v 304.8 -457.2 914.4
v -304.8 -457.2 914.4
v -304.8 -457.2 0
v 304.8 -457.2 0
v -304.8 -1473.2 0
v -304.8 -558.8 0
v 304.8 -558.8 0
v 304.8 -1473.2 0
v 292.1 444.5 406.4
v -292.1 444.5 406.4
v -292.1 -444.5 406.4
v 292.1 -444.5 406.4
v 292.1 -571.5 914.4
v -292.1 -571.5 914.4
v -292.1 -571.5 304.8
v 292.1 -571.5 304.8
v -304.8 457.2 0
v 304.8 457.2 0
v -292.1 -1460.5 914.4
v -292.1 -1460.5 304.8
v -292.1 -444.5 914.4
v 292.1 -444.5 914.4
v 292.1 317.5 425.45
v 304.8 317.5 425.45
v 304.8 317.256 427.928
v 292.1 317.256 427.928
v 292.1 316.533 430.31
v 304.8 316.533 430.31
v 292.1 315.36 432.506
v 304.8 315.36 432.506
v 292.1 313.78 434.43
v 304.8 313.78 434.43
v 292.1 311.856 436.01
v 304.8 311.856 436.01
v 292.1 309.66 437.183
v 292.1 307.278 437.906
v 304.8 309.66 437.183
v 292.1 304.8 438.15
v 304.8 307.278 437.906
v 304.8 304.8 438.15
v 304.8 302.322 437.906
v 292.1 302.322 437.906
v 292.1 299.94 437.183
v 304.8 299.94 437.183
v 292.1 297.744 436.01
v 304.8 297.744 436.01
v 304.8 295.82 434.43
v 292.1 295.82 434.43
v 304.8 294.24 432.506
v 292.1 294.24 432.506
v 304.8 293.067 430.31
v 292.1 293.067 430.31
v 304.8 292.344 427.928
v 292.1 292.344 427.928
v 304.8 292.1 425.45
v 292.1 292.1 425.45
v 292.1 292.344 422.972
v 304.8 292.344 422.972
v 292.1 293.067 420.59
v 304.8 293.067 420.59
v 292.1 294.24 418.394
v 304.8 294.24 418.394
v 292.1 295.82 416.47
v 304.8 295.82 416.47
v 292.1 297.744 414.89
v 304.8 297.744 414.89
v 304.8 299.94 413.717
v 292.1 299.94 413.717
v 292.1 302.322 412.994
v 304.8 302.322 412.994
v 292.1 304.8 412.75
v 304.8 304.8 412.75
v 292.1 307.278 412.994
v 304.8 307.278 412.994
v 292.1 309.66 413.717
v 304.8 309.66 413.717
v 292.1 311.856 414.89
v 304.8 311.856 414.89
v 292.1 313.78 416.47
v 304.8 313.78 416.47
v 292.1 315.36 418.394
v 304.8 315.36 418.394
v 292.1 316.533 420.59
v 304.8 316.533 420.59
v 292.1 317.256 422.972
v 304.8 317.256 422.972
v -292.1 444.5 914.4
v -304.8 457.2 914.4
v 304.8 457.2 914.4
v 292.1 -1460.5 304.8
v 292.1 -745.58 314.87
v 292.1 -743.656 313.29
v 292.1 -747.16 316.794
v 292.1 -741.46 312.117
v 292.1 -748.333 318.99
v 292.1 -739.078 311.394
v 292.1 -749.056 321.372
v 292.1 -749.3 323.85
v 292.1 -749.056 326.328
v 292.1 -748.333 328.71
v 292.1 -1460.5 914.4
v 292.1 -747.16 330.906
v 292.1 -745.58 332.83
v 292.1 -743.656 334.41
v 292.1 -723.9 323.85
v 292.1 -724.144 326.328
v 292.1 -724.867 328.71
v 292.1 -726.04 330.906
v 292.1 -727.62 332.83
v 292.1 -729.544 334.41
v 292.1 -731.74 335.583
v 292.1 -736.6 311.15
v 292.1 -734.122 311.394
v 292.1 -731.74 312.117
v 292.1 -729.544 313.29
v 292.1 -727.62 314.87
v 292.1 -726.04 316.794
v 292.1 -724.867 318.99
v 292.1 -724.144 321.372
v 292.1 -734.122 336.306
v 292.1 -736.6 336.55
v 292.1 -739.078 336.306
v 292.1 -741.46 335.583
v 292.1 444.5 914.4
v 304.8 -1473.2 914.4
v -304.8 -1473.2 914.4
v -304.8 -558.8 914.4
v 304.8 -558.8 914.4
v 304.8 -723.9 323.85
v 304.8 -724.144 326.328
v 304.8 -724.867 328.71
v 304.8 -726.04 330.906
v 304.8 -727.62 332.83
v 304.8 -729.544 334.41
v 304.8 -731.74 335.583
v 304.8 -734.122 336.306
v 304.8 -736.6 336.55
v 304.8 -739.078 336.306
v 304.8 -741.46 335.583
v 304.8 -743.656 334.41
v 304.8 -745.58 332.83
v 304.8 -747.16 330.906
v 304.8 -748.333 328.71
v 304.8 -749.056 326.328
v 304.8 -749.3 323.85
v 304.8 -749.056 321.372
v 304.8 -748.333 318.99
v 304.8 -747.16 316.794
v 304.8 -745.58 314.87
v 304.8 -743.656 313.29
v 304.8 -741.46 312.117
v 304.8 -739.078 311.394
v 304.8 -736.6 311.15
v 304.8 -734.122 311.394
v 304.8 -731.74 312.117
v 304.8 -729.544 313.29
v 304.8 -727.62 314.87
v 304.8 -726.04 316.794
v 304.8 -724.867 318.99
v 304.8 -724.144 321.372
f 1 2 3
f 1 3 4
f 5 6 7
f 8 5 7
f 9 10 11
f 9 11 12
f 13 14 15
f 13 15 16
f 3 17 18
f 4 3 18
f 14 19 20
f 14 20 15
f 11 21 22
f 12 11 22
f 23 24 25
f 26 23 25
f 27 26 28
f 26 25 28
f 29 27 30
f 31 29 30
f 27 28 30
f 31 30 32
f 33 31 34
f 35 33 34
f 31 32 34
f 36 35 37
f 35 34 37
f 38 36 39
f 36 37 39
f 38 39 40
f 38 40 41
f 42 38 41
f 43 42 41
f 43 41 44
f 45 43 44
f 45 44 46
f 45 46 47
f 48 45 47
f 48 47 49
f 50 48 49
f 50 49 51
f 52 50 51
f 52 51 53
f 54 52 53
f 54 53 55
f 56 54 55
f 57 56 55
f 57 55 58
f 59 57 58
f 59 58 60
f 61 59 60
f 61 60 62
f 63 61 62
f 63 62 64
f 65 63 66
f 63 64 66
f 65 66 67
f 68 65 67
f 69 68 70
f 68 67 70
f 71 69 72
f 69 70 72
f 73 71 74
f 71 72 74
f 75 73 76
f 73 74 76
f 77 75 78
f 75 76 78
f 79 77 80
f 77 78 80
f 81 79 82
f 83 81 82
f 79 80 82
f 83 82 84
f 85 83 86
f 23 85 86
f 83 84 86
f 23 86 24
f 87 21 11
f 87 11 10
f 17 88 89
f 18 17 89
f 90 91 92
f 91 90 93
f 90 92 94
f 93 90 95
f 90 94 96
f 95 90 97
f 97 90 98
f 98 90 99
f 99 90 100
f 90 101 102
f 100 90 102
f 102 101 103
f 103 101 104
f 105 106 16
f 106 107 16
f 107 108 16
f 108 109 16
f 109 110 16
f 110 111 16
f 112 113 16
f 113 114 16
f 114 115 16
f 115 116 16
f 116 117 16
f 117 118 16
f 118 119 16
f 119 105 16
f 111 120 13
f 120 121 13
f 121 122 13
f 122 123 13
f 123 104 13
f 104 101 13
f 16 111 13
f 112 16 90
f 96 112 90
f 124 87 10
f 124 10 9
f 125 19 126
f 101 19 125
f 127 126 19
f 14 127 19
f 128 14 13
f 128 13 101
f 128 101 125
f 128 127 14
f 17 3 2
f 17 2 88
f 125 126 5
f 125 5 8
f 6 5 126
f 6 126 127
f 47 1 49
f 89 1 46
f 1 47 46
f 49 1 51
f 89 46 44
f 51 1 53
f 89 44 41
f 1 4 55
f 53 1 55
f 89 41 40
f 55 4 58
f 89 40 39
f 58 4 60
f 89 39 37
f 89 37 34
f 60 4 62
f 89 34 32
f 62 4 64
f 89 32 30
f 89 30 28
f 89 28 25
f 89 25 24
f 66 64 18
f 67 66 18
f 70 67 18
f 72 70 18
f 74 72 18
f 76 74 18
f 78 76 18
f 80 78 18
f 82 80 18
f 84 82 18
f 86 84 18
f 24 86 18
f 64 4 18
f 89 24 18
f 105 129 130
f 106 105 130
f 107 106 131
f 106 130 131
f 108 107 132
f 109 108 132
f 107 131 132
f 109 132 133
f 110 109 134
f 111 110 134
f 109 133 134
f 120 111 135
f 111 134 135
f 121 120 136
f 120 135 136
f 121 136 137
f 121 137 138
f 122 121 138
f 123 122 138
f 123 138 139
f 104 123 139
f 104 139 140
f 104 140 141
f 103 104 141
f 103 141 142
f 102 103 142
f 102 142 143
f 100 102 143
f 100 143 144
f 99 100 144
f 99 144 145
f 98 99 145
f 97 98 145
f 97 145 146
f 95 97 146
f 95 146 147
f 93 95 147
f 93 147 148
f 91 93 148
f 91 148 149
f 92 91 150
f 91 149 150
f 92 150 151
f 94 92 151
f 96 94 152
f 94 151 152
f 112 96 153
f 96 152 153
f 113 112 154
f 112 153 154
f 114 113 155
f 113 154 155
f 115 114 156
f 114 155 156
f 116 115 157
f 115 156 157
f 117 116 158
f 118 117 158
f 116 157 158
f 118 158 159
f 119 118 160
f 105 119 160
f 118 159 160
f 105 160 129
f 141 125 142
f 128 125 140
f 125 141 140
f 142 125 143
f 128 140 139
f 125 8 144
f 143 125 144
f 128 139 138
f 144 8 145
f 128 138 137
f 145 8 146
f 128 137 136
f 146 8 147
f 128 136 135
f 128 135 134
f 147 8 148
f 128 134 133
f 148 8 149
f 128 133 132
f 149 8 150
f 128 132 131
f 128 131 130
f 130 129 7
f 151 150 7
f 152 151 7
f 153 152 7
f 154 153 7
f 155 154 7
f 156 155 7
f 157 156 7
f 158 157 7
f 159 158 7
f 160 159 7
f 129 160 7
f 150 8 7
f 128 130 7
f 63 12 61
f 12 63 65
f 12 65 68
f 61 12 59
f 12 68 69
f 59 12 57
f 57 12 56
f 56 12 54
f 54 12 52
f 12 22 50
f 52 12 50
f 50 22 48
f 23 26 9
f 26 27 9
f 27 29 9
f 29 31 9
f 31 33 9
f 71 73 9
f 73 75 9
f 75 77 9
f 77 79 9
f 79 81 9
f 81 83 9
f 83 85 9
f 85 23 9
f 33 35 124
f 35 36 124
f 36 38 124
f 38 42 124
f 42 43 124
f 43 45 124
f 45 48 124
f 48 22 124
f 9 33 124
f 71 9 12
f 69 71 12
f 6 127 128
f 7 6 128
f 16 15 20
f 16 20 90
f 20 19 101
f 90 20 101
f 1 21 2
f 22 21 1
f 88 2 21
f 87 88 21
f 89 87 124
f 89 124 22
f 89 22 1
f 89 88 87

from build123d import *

# Parameters (mm, degrees)
F0_W      = 609.6
F0_H      = 914.4
F1_DEPTH  = 914.4
F2_W      = 609.6
F2_H      = 914.4
F3_DEPTH  = 914.4
F4_W      = 584.2
F4_H      = 889
F5_DEPTH  = 508
F6_W      = 584.2
F6_H      = 889
F7_DEPTH  = 609.6
F8_R      = 12.7
F9_DEPTH  = 25.4
F10_R     = 12.7
F11_DEPTH = 25.4


with BuildPart() as f1:
    # F0 (on Top) → F1 (new body)
    with BuildSketch(Plane.XY):
        Rectangle(F0_W, F0_H)
    extrude(amount=F1_DEPTH)

    # F4 (on face) → F5 (cut)
    with BuildSketch(Plane.XY.offset(914.4)):
        Rectangle(F4_W, F4_H)
    extrude(amount=-F5_DEPTH, mode=Mode.SUBTRACT)

    # F8 (on face) → F9 (cut)
    with BuildSketch(Plane.YZ.offset(304.8)):
        with Locations((304.8, 425.45)):
            Circle(F8_R)
    extrude(amount=-F9_DEPTH, mode=Mode.SUBTRACT)


with BuildPart() as f3:
    # F2 (on Top) → F3 (new body)
    with BuildSketch(Plane.XY):
        with Locations((0, -1016)):
            Rectangle(F2_W, F2_H)
    extrude(amount=F3_DEPTH)

    # F6 (on face) → F7 (cut)
    with BuildSketch(Plane.XY.offset(914.4)):
        with Locations((0, -1016)):
            Rectangle(F6_W, F6_H)
    extrude(amount=-F7_DEPTH, mode=Mode.SUBTRACT)

    # F10 (on face) → F11 (cut)
    with BuildSketch(Plane.YZ.offset(304.8)):
        with Locations((-736.6, 323.85)):
            Circle(F10_R)
    extrude(amount=-F11_DEPTH, mode=Mode.SUBTRACT)


solid = Compound([f1.part, f3.part])
